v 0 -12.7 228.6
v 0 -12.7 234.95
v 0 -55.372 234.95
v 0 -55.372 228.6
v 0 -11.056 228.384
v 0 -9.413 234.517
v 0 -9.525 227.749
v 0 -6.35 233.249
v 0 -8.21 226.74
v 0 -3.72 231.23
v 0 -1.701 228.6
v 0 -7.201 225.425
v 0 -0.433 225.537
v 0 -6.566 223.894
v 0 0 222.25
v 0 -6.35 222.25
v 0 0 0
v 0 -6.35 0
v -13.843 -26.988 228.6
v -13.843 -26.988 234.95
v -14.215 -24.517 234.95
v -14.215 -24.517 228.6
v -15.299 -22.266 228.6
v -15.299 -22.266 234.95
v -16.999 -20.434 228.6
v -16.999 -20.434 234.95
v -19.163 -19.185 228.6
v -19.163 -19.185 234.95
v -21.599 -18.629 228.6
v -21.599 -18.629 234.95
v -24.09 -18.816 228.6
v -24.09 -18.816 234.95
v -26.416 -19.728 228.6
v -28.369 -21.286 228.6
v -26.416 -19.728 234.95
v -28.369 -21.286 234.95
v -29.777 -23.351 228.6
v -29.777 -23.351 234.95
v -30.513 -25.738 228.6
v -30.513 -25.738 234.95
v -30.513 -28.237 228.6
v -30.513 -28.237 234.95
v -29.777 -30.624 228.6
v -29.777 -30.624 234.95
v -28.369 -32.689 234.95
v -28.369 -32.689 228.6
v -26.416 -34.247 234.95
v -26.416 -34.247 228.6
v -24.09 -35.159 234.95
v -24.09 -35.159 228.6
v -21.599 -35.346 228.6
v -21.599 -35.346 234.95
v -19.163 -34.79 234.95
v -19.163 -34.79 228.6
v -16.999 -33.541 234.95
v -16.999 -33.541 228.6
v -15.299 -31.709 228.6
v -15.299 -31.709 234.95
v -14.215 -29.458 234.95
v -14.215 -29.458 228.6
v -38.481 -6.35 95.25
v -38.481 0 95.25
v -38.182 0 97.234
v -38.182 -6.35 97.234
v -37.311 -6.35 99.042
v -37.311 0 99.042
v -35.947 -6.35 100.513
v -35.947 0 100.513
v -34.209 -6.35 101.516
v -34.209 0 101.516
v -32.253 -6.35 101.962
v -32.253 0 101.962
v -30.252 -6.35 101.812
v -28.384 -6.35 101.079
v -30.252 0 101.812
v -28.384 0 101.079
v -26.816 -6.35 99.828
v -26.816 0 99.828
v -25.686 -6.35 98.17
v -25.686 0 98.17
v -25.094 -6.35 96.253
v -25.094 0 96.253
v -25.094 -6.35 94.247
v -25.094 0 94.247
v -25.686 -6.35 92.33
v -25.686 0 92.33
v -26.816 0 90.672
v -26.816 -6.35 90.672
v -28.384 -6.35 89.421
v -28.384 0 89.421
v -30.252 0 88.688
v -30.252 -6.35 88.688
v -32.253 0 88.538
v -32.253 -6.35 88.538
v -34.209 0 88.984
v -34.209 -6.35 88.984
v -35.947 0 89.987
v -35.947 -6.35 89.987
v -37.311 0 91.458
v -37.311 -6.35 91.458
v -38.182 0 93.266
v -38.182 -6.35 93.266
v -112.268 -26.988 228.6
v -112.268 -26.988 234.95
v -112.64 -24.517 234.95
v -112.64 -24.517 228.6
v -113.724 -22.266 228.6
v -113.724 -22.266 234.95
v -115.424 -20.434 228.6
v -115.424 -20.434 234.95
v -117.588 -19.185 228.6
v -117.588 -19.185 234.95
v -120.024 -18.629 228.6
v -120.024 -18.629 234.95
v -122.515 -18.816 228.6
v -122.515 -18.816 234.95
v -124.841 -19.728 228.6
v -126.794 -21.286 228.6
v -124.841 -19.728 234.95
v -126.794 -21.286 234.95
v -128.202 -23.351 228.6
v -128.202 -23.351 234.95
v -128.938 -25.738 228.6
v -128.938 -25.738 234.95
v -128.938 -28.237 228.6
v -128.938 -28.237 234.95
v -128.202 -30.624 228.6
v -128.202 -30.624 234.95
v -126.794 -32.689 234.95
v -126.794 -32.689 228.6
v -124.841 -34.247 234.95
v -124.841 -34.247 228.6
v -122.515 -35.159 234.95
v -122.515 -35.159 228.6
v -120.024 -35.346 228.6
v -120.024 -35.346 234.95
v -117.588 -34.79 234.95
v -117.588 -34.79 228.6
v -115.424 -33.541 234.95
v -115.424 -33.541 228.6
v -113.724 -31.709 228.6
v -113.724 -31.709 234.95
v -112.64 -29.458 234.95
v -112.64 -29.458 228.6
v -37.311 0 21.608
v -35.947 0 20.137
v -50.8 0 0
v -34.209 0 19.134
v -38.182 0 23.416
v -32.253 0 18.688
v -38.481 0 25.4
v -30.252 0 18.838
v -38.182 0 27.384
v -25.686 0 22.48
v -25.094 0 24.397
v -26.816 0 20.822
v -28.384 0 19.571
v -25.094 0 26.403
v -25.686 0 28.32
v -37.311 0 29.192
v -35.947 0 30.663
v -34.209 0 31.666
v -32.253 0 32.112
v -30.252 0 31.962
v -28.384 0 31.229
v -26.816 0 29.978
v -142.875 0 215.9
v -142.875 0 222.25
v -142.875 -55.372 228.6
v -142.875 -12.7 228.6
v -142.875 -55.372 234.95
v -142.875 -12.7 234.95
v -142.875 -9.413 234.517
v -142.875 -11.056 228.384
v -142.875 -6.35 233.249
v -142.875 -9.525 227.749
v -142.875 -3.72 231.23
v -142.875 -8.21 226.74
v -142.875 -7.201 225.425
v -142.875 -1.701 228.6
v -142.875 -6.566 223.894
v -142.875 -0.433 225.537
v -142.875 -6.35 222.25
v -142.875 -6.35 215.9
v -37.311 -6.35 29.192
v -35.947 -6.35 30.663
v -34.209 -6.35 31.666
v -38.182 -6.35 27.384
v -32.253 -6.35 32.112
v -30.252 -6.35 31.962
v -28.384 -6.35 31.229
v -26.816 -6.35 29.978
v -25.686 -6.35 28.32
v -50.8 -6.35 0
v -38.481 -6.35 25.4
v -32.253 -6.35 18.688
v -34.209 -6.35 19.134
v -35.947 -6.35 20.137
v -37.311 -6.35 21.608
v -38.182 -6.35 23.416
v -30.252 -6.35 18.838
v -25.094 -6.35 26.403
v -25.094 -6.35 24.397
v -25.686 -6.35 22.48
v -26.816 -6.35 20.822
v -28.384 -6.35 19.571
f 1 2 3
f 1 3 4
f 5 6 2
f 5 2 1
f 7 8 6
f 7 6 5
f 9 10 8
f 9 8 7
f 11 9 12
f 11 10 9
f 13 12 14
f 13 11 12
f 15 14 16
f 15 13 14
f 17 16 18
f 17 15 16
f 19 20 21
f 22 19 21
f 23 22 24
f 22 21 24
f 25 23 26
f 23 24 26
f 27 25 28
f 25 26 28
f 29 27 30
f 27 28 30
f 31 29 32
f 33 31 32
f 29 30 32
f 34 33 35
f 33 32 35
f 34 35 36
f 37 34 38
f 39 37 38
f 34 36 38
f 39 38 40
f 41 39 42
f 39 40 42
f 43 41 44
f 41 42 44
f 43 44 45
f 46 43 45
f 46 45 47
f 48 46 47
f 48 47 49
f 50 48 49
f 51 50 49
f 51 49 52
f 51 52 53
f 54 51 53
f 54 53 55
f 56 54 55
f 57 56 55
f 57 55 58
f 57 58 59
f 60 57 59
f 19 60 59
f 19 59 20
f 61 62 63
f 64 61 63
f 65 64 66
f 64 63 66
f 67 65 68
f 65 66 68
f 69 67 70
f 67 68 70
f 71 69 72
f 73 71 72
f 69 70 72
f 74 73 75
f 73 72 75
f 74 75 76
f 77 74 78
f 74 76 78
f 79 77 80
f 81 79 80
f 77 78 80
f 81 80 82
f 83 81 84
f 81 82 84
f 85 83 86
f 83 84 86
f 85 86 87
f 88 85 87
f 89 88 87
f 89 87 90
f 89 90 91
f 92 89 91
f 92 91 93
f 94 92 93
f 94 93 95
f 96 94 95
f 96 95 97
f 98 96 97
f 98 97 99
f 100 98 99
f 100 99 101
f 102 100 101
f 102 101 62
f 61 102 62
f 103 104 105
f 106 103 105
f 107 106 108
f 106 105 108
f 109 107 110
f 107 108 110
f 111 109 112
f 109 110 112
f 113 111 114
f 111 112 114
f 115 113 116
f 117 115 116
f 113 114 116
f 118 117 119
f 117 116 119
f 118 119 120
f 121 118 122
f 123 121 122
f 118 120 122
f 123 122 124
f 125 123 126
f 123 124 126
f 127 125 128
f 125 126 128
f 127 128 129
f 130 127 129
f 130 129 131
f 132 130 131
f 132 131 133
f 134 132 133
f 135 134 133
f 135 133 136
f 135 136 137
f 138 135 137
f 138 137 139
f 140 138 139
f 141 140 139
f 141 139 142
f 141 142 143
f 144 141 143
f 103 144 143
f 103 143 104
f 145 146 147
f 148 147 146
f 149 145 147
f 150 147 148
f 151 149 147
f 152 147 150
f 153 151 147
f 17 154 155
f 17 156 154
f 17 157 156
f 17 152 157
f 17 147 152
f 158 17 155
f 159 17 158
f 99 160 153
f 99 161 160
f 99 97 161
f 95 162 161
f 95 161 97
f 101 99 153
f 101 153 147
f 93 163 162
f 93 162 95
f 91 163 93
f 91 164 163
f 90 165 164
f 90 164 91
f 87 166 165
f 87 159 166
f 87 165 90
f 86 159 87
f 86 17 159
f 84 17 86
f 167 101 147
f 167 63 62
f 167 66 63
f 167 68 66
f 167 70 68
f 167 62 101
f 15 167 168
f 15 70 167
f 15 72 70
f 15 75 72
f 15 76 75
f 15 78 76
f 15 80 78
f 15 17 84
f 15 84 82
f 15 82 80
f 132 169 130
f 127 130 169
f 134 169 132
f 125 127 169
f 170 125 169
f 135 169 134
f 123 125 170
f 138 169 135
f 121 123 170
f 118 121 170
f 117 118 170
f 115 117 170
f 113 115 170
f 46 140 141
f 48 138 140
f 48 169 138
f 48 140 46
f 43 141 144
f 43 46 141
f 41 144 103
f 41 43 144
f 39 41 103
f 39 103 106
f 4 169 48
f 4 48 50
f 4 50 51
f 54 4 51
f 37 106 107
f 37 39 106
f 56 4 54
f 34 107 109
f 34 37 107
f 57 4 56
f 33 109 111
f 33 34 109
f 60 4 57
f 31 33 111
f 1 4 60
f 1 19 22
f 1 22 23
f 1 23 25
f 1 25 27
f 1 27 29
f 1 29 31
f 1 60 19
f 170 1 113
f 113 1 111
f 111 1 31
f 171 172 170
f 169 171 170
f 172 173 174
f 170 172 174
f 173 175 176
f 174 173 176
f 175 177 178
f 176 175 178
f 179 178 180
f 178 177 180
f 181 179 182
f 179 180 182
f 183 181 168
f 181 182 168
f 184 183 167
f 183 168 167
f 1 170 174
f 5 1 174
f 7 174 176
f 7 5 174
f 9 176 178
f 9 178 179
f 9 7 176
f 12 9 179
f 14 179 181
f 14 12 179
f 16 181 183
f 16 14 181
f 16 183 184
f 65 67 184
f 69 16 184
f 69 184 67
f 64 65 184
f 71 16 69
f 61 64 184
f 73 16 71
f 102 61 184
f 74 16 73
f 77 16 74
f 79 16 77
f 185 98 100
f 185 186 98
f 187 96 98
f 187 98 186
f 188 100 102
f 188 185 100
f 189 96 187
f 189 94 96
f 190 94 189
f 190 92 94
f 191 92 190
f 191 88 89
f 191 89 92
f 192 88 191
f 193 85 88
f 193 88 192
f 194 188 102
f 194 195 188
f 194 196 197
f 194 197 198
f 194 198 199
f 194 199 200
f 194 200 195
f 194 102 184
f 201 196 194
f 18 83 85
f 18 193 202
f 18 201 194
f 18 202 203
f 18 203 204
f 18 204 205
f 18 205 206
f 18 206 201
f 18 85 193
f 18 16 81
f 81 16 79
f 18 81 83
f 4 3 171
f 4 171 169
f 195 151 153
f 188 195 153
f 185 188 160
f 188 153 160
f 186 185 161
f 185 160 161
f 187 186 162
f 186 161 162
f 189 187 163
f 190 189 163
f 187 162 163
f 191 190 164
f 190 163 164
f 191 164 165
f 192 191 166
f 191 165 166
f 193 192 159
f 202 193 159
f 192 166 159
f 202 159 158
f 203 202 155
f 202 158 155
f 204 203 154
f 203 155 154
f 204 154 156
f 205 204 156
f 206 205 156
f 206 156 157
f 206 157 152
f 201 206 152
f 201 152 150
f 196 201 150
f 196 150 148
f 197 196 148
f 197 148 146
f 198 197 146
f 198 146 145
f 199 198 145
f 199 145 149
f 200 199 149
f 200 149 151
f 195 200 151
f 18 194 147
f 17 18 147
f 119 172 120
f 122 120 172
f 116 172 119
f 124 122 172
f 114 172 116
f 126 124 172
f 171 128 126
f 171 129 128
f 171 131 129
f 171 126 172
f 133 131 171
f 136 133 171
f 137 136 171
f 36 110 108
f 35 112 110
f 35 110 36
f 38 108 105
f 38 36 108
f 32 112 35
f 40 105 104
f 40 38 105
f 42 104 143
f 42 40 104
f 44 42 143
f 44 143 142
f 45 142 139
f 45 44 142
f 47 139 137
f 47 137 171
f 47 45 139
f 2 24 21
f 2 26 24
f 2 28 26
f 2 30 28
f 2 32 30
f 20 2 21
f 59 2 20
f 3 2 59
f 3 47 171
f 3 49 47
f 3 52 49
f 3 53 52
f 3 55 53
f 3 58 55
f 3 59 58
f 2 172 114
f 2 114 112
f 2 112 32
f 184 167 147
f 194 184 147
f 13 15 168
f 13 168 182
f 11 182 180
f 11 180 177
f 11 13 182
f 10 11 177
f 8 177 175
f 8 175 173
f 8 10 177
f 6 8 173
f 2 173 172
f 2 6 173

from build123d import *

# Parameters (mm, degrees)
BASE_EXTRUDE_DEPTH = 142.875
CUT_EXTRUDE1_REACH = 236.95
SKETCH2_R          = 8.382
CUT_EXTRUDE2_REACH = 57.372
SKETCH3_R          = 6.731


with BuildPart() as part:
    # Sketch1 → Base-Extrude (new body)
    with BuildSketch(Plane(origin=(0, 0, 0), x_dir=(0, 0, -1), z_dir=(1, 0, 0))):
        with BuildLine():
            Line((0, 0), (-222.25, 0))
            ThreePointArc((-222.25, 0), (-231.230256121, -3.719743879), (-234.95, -12.7))
            Line((-234.95, -12.7), (-234.95, -55.372))
            Line((-234.95, -55.372), (-228.6, -55.372))
            Line((-228.6, -55.372), (-228.6, -12.7))
            ThreePointArc((-228.6, -12.7), (-226.740128061, -8.209871939), (-222.25, -6.35))
            Line((-222.25, -6.35), (0, -6.35))
            Line((0, -6.35), (0, 0))
        make_face()
    extrude(amount=-BASE_EXTRUDE_DEPTH)

    # Sketch2 → Cut-Extrude1 (cut, up to next)
    with BuildSketch(Plane.XY.offset(234.95), mode=Mode.PRIVATE) as cut_extrude1_sk1:
        with Locations((-120.65, -26.9875)):
            Circle(SKETCH2_R)
    cut_extrude1_tool1 = extrude(cut_extrude1_sk1.sketch, amount=-CUT_EXTRUDE1_REACH, mode=Mode.PRIVATE) & part.part
    add(cut_extrude1_tool1.solids().sort_by_distance((-120.65, -26.9875, 234.95))[0], mode=Mode.SUBTRACT)
    # Sketch2 → Cut-Extrude1 (cut, up to next)
    with BuildSketch(Plane.XY.offset(234.95), mode=Mode.PRIVATE) as cut_extrude1_sk2:
        with Locations((-22.225, -26.9875)):
            Circle(SKETCH2_R)
    cut_extrude1_tool2 = extrude(cut_extrude1_sk2.sketch, amount=-CUT_EXTRUDE1_REACH, mode=Mode.PRIVATE) & part.part
    add(cut_extrude1_tool2.solids().sort_by_distance((-22.225, -26.9875, 234.95))[0], mode=Mode.SUBTRACT)

    # Sketch3 → Cut-Extrude2 (cut, up to next)
    with BuildSketch(Plane(origin=(0, 0, 0), x_dir=(-1, 0, 0), z_dir=(0, 1, 0)), mode=Mode.PRIVATE) as cut_extrude2_sk1:
        with Locations((31.75, 95.25)):
            Circle(SKETCH3_R)
    cut_extrude2_tool1 = extrude(cut_extrude2_sk1.sketch, amount=-CUT_EXTRUDE2_REACH, mode=Mode.PRIVATE) & part.part
    add(cut_extrude2_tool1.solids().sort_by_distance((-31.75, 0, 95.25))[0], mode=Mode.SUBTRACT)
    # Sketch3 → Cut-Extrude2 (cut, up to next)
    with BuildSketch(Plane(origin=(0, 0, 0), x_dir=(-1, 0, 0), z_dir=(0, 1, 0)), mode=Mode.PRIVATE) as cut_extrude2_sk2:
        with Locations((31.75, 25.4)):
            Circle(SKETCH3_R)
    cut_extrude2_tool2 = extrude(cut_extrude2_sk2.sketch, amount=-CUT_EXTRUDE2_REACH, mode=Mode.PRIVATE) & part.part
    add(cut_extrude2_tool2.solids().sort_by_distance((-31.75, 0, 25.4))[0], mode=Mode.SUBTRACT)
    # Sketch3 → Cut-Extrude2 (cut, up to next)
    with BuildSketch(Plane(origin=(0, 0, 0), x_dir=(-1, 0, 0), z_dir=(0, 1, 0)), mode=Mode.PRIVATE) as cut_extrude2_sk3:
        Polygon((142.875, 215.9), (50.8, 0), (142.875, 0), align=None)
    cut_extrude2_tool3 = extrude(cut_extrude2_sk3.sketch, amount=-CUT_EXTRUDE2_REACH, mode=Mode.PRIVATE) & part.part
    add(cut_extrude2_tool3.solids().sort_by_distance((-112.183333, 0, 71.966667))[0], mode=Mode.SUBTRACT)


solid = part.part
